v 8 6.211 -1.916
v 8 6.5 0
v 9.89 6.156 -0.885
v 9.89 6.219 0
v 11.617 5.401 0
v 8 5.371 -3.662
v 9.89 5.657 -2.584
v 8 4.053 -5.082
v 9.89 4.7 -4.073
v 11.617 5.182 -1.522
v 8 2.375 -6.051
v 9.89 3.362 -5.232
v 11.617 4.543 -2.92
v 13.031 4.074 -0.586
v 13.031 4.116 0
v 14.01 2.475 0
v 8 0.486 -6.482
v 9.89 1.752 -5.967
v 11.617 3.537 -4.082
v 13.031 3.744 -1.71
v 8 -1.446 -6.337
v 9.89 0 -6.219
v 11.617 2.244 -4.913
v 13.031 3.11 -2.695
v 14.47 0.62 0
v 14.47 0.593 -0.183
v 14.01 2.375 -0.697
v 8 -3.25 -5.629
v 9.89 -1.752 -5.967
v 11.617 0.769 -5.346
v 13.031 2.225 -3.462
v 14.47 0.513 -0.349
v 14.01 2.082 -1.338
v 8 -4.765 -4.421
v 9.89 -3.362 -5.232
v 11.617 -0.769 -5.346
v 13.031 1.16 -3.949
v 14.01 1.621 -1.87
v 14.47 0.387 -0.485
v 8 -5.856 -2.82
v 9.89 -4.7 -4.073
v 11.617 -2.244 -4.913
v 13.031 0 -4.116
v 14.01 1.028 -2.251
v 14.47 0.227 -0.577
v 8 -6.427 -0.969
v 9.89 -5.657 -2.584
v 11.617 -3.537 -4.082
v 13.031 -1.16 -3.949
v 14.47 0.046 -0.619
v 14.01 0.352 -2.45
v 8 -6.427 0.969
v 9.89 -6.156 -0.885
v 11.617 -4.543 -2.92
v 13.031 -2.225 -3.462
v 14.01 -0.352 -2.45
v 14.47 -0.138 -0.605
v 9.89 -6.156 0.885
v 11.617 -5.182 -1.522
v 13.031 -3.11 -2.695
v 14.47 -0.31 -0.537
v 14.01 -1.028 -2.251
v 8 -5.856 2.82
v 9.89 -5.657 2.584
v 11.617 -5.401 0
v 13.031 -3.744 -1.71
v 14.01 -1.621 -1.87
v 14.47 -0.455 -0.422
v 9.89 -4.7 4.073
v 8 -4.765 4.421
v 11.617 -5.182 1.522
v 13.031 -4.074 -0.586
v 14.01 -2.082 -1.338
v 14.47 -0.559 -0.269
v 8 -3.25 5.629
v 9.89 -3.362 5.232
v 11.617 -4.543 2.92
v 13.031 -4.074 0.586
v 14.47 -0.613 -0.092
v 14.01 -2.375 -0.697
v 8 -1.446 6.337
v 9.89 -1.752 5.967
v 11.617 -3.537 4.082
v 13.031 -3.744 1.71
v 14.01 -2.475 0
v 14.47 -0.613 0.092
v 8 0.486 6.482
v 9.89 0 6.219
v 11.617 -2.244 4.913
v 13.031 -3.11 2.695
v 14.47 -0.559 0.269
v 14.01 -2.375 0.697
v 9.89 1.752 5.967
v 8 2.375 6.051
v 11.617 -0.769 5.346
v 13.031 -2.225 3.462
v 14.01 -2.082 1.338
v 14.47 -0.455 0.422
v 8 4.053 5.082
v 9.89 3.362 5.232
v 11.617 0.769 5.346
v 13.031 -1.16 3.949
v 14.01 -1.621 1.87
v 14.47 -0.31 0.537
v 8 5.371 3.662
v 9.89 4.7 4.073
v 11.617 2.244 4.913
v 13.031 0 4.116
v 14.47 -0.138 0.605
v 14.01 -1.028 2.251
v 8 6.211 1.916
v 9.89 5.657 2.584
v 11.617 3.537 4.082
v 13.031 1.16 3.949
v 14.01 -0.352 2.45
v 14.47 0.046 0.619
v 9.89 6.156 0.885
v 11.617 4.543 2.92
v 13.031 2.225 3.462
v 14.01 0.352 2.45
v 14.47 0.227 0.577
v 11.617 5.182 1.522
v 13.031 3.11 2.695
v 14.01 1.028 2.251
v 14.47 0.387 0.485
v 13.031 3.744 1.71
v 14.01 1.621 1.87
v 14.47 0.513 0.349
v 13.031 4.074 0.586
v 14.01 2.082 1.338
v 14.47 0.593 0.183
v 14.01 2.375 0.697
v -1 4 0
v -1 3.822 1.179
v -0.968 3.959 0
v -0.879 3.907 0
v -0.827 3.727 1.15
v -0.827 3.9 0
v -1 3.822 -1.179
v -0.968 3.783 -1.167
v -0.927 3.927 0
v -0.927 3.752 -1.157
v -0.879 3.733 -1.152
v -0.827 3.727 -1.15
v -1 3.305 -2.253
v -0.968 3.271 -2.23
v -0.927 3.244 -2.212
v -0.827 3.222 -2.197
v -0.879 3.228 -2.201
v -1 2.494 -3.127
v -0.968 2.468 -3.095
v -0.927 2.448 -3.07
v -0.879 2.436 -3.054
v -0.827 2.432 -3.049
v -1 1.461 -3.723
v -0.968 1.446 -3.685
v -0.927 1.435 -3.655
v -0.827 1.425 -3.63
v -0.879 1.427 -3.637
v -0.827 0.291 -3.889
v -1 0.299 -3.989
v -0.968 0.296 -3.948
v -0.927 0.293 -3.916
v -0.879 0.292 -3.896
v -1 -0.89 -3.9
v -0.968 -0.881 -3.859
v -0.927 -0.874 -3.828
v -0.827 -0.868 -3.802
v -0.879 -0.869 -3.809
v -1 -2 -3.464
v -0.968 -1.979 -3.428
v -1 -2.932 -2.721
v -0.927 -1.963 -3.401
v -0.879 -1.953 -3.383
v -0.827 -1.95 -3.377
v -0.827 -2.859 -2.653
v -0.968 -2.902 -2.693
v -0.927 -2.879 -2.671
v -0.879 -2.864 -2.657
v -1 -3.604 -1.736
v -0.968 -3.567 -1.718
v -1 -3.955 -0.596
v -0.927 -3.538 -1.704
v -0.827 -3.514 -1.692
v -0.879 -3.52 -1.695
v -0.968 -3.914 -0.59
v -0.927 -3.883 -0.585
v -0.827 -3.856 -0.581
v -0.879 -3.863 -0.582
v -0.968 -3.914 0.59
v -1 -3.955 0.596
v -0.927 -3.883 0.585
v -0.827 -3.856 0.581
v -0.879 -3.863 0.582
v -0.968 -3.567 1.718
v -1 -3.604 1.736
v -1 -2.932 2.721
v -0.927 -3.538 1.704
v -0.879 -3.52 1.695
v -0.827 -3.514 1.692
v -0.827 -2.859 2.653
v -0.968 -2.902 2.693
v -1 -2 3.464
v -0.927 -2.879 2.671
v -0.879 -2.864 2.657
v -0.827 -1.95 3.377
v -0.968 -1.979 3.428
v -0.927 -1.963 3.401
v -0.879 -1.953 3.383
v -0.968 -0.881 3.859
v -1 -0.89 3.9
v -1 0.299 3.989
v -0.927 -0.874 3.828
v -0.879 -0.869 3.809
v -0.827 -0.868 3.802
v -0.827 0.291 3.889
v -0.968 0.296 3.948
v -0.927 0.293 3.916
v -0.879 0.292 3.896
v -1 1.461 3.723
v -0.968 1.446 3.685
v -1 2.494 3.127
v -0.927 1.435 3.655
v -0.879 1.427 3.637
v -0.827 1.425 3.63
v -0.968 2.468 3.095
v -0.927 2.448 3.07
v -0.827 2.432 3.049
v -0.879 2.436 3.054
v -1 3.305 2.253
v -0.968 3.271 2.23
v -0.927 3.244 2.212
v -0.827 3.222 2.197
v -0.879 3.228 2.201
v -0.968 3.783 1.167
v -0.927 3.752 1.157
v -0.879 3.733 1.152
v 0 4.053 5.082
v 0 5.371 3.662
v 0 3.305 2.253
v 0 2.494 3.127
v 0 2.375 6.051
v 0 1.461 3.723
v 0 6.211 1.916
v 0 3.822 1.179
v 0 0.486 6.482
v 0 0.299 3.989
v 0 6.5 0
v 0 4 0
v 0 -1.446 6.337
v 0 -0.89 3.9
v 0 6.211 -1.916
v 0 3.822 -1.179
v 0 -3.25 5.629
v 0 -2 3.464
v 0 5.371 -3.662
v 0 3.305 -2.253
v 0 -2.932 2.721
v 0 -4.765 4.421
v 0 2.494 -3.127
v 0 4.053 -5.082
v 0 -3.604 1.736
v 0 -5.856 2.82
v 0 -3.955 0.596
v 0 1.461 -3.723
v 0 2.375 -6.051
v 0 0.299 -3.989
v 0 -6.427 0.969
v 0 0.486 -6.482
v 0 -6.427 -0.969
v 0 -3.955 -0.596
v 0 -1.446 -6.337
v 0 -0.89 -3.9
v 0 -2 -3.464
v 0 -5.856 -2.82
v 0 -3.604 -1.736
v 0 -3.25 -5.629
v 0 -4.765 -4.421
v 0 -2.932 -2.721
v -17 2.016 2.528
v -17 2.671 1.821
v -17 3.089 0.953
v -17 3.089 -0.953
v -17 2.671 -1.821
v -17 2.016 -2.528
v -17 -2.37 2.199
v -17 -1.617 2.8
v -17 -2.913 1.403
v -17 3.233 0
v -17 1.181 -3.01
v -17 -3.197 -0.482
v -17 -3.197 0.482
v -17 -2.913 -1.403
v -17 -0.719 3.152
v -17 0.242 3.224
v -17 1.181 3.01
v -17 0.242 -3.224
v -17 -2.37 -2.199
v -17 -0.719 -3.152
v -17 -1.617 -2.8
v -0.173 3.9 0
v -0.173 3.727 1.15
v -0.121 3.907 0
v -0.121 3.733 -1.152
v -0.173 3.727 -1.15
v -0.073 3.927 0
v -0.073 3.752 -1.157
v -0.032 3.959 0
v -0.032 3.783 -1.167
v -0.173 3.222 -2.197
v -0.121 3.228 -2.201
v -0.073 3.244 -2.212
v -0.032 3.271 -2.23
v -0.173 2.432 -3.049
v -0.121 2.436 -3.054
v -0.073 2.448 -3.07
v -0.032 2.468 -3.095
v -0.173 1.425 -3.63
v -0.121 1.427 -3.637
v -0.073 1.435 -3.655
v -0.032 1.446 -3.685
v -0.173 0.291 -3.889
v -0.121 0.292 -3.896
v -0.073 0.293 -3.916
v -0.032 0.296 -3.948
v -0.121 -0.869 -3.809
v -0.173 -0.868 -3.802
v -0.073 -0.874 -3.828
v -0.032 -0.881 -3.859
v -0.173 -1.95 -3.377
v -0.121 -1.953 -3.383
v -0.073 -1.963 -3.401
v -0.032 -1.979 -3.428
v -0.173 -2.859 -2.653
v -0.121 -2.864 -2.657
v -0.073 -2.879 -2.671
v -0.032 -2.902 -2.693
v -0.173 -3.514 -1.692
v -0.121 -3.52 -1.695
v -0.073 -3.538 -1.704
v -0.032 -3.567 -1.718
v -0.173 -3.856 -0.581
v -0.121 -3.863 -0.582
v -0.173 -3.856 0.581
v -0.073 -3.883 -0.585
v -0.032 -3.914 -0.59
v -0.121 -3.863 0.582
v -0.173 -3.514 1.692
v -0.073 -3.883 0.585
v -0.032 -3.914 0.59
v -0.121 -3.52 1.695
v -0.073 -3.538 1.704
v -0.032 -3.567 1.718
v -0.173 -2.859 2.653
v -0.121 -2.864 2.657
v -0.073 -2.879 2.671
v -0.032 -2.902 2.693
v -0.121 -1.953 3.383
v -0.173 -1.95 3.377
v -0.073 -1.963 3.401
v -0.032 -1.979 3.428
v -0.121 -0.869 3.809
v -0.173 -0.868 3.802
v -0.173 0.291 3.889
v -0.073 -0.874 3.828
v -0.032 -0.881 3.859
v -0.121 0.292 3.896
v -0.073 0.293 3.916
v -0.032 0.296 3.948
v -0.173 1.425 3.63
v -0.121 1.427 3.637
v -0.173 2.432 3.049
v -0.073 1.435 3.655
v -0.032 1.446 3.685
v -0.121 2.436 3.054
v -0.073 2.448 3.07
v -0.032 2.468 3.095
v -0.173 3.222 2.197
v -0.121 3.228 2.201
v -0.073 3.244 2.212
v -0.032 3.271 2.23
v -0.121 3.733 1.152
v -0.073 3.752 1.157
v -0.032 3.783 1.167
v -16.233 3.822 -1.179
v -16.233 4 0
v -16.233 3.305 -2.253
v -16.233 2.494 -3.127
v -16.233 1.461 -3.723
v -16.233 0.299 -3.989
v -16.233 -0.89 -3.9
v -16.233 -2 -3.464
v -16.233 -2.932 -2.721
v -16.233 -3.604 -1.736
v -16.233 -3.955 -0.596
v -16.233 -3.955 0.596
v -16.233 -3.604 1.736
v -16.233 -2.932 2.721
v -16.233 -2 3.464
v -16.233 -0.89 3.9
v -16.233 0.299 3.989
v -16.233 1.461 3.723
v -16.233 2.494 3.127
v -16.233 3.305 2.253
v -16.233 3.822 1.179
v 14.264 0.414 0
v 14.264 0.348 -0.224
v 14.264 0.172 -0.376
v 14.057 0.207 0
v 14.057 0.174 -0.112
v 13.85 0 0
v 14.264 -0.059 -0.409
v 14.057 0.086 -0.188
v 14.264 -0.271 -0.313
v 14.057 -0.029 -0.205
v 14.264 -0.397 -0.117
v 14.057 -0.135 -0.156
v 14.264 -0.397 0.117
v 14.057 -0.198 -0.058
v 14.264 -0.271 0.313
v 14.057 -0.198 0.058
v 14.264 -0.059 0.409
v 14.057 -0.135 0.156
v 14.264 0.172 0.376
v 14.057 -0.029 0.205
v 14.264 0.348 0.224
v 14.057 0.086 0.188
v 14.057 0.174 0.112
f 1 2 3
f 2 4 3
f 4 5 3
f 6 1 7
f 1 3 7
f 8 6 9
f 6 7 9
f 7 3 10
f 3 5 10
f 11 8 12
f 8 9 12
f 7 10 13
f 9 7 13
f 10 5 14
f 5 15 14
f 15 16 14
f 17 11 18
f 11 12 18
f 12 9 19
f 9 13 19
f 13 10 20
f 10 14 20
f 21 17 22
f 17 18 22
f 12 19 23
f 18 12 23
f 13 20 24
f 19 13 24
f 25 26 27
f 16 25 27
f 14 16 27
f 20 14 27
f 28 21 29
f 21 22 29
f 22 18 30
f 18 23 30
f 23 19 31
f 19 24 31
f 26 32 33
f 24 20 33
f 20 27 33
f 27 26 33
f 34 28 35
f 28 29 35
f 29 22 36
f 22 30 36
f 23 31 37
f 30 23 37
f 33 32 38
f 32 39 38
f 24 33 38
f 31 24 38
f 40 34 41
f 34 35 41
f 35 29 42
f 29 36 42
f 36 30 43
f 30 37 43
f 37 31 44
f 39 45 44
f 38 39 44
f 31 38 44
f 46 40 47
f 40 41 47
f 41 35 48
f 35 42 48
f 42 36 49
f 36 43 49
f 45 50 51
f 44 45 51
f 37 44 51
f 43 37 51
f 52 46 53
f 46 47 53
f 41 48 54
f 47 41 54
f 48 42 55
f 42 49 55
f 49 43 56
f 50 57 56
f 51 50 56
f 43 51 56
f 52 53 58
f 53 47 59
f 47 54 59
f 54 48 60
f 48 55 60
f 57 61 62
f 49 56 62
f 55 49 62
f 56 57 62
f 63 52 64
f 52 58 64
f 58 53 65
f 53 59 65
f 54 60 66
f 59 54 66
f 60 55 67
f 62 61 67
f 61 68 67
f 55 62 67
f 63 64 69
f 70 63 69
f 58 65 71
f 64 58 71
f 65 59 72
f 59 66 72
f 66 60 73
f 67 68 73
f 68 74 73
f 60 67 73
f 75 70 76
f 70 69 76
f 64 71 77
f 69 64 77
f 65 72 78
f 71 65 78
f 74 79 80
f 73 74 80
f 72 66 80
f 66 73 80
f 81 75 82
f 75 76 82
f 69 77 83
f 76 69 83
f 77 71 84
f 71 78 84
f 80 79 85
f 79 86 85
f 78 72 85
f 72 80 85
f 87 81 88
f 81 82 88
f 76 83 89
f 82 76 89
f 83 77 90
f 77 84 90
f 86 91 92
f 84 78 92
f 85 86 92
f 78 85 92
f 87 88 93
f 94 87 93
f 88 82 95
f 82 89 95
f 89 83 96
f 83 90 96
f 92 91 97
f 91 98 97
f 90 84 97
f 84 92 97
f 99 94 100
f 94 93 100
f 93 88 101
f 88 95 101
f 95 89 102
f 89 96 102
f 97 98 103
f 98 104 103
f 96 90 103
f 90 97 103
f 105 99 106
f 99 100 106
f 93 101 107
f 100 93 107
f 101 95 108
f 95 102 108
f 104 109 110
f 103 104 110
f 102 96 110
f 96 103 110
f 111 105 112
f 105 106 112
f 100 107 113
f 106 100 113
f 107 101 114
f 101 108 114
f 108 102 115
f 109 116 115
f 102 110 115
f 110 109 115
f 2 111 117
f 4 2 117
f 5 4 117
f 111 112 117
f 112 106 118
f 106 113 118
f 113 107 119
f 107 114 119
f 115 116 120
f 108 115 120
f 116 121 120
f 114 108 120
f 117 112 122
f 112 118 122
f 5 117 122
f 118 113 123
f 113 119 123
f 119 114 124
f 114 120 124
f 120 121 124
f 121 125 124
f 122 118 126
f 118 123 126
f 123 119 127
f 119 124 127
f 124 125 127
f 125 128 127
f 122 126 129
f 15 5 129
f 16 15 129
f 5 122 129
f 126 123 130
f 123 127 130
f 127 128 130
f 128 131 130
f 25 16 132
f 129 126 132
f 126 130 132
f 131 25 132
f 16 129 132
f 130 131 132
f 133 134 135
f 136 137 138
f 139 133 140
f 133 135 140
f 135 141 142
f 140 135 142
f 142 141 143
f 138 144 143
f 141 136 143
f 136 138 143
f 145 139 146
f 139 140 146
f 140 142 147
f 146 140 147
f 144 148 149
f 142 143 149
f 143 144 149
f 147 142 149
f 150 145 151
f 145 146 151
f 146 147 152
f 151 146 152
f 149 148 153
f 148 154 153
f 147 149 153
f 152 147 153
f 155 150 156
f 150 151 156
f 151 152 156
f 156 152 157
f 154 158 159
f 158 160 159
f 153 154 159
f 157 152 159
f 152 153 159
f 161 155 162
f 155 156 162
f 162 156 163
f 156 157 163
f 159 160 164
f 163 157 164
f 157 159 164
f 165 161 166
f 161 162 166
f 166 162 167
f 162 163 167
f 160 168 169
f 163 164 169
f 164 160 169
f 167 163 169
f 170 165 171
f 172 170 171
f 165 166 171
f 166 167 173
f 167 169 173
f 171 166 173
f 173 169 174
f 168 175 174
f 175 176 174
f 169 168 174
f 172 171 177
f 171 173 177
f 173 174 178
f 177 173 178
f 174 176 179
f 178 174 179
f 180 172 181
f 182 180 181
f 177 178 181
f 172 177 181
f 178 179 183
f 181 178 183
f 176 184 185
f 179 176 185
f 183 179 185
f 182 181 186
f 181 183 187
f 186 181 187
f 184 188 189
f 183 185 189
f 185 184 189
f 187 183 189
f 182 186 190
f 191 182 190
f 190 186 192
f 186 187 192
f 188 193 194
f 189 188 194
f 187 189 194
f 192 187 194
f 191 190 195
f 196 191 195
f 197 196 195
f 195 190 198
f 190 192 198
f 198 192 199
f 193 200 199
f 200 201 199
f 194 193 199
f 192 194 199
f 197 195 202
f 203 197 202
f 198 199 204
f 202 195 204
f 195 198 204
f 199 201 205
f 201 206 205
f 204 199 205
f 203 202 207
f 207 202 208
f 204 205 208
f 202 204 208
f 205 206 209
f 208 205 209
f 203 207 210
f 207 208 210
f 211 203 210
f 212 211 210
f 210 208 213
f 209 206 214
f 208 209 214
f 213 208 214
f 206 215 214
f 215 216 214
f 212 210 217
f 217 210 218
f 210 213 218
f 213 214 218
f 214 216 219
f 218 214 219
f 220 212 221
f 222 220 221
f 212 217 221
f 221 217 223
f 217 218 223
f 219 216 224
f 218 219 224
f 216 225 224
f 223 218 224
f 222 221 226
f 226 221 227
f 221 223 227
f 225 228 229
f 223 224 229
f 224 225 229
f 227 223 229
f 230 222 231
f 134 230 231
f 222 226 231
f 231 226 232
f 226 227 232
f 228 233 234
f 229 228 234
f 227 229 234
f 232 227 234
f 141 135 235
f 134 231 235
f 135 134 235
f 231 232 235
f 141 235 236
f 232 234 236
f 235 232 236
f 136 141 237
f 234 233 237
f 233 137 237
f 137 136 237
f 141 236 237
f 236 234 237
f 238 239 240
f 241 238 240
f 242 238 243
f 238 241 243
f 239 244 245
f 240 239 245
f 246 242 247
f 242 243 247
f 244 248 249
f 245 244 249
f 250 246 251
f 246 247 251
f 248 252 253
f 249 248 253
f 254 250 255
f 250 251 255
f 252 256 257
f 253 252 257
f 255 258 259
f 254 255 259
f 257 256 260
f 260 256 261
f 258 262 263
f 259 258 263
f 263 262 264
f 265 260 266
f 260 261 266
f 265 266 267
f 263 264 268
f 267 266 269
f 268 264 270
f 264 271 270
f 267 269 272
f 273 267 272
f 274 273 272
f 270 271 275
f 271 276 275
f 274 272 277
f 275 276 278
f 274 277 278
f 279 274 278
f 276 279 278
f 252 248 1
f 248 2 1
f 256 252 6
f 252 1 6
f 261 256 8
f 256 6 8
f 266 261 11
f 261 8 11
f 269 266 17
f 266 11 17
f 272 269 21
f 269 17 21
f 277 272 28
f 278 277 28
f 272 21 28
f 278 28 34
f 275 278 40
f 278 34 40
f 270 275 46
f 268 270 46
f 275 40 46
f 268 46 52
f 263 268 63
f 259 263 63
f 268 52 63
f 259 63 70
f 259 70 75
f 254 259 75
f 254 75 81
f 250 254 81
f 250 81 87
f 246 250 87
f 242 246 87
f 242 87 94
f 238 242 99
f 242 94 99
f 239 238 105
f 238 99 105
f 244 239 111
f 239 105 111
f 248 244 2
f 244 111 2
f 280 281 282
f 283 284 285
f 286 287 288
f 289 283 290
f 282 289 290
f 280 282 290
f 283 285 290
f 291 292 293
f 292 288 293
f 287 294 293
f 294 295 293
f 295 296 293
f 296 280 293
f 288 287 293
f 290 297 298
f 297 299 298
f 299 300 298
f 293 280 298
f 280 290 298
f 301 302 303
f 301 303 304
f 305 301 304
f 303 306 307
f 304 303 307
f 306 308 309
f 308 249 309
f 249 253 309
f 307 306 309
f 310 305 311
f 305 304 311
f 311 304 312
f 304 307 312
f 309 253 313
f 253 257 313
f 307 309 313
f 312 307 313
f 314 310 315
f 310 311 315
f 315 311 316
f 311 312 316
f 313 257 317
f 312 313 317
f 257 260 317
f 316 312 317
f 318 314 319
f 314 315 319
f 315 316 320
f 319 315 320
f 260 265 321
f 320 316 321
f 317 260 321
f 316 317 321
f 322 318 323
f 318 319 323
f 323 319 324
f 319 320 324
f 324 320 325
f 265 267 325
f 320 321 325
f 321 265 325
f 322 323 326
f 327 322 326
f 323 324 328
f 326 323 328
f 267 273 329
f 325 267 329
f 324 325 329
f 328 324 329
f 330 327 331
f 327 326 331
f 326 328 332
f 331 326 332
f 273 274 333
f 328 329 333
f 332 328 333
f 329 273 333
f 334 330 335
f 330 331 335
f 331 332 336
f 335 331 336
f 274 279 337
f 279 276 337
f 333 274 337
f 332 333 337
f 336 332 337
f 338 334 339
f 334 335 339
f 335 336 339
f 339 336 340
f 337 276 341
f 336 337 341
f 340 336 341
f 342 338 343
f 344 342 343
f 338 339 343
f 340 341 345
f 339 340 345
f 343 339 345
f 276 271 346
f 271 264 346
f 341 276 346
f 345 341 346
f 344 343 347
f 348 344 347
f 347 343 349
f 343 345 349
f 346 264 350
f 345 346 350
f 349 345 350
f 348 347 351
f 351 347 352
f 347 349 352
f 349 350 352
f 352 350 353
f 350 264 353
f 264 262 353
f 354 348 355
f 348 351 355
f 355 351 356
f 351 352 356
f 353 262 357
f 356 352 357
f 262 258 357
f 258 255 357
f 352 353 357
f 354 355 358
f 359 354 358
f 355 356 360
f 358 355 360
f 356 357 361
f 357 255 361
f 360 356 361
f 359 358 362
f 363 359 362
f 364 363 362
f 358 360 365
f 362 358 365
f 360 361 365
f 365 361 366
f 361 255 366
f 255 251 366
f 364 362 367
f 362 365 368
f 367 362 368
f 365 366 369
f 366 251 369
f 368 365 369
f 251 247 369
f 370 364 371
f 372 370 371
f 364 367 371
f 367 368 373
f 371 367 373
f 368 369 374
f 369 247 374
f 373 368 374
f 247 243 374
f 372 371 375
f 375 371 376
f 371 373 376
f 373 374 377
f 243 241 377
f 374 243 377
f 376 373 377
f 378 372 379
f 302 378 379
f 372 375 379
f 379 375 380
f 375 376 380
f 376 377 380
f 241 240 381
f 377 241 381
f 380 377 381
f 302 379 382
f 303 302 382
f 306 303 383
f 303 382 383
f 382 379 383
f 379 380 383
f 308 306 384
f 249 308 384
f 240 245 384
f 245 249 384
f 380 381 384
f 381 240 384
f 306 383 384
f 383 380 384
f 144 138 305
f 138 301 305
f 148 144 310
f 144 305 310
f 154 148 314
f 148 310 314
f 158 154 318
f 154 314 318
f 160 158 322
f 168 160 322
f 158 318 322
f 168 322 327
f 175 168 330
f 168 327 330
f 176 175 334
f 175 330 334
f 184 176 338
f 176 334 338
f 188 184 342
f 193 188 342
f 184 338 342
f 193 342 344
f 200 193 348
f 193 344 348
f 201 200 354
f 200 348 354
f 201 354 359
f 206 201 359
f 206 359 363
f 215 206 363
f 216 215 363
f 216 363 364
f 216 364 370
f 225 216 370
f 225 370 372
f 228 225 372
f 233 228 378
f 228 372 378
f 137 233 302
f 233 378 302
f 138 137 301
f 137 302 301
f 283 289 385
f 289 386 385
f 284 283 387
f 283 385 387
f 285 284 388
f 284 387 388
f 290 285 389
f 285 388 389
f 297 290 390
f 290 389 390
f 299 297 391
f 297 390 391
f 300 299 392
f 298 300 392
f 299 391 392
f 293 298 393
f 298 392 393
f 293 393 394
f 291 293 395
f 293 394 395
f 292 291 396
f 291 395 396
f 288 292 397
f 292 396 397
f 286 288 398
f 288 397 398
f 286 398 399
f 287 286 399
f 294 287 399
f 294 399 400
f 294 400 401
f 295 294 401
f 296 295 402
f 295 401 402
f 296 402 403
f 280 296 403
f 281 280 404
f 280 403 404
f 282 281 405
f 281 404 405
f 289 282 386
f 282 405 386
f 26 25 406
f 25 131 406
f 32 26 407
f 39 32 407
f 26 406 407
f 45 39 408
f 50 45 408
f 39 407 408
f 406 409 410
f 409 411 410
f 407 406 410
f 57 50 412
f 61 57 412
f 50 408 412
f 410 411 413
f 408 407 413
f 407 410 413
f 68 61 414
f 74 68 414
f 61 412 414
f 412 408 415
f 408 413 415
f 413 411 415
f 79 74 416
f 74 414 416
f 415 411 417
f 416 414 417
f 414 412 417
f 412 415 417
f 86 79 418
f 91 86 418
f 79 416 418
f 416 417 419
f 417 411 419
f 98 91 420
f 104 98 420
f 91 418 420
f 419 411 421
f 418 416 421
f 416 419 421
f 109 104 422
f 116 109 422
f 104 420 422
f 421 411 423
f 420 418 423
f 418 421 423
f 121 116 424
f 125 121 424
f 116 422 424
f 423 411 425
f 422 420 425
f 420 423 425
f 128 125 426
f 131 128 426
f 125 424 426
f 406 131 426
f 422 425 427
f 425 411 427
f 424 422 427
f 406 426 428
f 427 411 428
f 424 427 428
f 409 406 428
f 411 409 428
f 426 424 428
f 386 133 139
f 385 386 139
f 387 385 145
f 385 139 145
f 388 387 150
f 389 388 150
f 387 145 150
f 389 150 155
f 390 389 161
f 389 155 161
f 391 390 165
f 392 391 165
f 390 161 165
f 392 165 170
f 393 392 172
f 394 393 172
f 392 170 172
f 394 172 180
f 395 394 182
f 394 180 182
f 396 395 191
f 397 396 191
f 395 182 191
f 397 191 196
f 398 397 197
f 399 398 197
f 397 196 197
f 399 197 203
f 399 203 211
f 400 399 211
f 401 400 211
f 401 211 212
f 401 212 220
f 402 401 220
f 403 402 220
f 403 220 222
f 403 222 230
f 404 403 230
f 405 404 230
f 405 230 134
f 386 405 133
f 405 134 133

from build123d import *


with BuildPart() as part:
    # Sketch1 → Revolve1 (revolve)
    with BuildSketch(Plane.XY):
        Polygon((-17, 0), (-17, 3.233), (-16.233, 4), (0, 4), (0, 0), align=None)
    revolve(axis=Axis((0, 0, 0), (-1, 0, 0)))

    # Sketch2 → Revolve2 (revolve)
    with BuildSketch(Plane.XY):
        with BuildLine():
            Line((0, 0), (0, 6.5))
            Line((0, 6.5), (8, 6.5))
            ThreePointArc((8, 6.5), (12.371375393, 4.81051735), (14.470331437, 0.620331437))
            Line((14.470331437, 0.620331437), (13.85, 0))
            Line((13.85, 0), (0, 0))
        make_face()
    revolve(axis=Axis((50, 0, 0), (-1, 0, 0)))

    # Sketch3 → Cut-Revolve1 (revolve, cut)
    with BuildSketch(Plane.XY):
        with BuildLine():
            Line((-0.826794919, 3.9), (-0.173205081, 3.9))
            ThreePointArc((-0.173205081, 3.9), (-0.073205081, 3.926794919), (0, 4))
            Line((0, 4), (0, 4.9))
            Line((0, 4.9), (-1, 4.9))
            Line((-1, 4.9), (-1, 4))
            ThreePointArc((-1, 4), (-0.926794919, 3.926794919), (-0.826794919, 3.9))
        make_face()
    revolve(axis=Axis((0, 0, 0), (-1, 0, 0)), mode=Mode.SUBTRACT)


solid = part.part
